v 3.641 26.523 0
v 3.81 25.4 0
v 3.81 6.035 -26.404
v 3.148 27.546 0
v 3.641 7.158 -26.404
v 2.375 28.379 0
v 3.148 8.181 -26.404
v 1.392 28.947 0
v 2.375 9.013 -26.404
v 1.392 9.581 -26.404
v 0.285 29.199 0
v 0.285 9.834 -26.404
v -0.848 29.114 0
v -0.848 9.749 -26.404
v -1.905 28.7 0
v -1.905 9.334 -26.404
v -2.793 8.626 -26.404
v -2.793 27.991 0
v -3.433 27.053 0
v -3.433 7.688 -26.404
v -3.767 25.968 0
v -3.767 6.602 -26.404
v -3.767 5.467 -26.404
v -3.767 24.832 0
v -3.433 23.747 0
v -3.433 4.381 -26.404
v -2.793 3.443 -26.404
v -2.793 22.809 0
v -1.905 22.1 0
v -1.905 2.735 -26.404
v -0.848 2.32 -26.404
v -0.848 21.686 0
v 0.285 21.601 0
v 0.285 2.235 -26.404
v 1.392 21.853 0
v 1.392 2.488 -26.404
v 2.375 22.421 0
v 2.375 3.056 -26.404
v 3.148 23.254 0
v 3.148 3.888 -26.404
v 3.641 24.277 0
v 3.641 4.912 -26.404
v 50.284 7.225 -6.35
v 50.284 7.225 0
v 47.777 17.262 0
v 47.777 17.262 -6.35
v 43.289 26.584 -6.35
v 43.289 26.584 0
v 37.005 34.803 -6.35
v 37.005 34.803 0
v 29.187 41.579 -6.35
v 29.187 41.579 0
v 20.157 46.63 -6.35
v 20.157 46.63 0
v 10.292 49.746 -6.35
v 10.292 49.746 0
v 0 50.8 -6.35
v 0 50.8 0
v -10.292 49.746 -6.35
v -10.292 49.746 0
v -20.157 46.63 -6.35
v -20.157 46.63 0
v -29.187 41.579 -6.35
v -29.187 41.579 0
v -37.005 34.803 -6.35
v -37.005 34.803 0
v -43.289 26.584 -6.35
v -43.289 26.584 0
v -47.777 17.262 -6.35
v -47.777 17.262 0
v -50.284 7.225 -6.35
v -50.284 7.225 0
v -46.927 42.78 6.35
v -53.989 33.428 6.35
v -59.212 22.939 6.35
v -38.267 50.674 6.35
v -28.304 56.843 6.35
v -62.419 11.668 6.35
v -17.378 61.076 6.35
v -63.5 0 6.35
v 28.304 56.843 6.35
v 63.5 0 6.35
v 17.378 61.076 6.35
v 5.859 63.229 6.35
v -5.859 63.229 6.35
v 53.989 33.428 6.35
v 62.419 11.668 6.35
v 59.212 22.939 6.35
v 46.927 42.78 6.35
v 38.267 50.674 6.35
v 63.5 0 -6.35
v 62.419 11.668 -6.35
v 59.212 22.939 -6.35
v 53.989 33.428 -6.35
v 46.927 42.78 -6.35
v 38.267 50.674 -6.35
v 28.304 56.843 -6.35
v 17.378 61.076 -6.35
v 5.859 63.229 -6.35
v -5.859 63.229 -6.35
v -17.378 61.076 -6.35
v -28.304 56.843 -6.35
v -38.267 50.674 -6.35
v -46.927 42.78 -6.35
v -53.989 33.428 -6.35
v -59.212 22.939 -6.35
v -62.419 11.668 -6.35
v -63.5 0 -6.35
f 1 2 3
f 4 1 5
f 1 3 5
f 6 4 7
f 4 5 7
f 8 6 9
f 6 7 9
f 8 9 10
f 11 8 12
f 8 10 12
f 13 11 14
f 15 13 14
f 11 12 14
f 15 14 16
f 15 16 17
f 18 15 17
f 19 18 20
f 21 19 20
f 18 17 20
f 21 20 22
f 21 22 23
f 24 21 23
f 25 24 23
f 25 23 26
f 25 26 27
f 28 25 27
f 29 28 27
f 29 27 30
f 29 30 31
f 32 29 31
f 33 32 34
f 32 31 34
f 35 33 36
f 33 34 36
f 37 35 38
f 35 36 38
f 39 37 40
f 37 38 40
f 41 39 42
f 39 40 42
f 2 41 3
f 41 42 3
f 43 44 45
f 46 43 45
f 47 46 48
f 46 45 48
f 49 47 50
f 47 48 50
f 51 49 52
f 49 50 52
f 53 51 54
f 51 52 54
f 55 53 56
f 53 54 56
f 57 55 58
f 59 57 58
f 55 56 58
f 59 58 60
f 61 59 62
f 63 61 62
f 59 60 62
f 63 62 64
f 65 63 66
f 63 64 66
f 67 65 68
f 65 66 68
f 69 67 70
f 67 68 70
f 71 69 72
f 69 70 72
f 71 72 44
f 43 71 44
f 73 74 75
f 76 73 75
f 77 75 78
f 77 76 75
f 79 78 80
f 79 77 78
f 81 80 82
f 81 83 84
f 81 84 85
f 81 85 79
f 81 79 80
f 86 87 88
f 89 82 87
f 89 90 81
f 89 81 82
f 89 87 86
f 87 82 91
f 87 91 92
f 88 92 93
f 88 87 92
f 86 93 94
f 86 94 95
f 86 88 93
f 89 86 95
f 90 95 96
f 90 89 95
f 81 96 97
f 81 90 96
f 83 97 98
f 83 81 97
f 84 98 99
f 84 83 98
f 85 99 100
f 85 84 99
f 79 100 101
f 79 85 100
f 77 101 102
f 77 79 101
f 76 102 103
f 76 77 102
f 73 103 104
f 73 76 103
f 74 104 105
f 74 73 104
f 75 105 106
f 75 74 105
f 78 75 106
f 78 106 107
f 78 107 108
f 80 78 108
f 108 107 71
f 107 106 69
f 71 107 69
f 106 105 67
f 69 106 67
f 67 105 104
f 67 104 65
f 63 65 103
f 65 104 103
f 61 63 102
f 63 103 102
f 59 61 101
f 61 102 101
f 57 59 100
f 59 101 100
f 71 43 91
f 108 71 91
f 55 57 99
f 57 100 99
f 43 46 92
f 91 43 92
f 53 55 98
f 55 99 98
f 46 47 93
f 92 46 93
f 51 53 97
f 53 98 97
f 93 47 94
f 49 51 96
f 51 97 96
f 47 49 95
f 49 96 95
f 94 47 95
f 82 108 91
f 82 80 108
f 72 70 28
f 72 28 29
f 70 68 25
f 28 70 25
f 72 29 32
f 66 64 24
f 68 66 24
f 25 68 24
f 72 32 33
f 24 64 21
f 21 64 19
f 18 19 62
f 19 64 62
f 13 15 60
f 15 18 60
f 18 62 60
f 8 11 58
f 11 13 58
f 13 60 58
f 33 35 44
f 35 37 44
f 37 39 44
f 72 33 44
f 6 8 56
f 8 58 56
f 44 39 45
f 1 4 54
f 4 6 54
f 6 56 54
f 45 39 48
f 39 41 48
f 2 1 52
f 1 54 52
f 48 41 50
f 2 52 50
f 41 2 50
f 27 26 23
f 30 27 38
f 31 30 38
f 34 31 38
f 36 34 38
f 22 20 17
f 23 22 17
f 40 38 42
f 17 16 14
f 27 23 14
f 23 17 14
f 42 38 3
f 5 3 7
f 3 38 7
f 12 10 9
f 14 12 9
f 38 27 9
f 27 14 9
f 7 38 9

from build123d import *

# Parameters (mm, degrees)
F1_DEPTH = 6.35
F3_DEPTH = 25.4
F4_R     = 3.81


with BuildPart() as f1:
    # F0 (on Top) → F1 (new body, symmetric)
    with BuildSketch(Plane.XY):
        with BuildLine():
            Line((-63.5, 0), (63.5, 0))
            ThreePointArc((63.5, 0), (0, 63.5), (-63.5, 0))
        make_face()
    extrude(amount=F1_DEPTH, both=True)

    # F2 (on Top) → F3 (cut)
    with BuildSketch(Plane.XY):
        with BuildLine():
            Line((-50.2836502119, 7.2245775906), (50.2836502119, 7.2245775906))
            ThreePointArc((50.2836502119, 7.2245775906), (0, 50.8), (-50.2836502119, 7.2245775906))
        make_face()
    extrude(amount=-F3_DEPTH, mode=Mode.SUBTRACT)

    # F6: sweep along a path in F5
    with BuildLine(Plane.YZ) as f6_path:
        Line((25.5370624363, 0), (6.1716223136, -26.4036767185))
    # F4 (on Top) → F6 (sweep)
    with BuildSketch(Plane.XY):
        with Locations((0, 25.4)):
            Circle(F4_R)
    sweep(path=f6_path.line)


solid = f1.part
